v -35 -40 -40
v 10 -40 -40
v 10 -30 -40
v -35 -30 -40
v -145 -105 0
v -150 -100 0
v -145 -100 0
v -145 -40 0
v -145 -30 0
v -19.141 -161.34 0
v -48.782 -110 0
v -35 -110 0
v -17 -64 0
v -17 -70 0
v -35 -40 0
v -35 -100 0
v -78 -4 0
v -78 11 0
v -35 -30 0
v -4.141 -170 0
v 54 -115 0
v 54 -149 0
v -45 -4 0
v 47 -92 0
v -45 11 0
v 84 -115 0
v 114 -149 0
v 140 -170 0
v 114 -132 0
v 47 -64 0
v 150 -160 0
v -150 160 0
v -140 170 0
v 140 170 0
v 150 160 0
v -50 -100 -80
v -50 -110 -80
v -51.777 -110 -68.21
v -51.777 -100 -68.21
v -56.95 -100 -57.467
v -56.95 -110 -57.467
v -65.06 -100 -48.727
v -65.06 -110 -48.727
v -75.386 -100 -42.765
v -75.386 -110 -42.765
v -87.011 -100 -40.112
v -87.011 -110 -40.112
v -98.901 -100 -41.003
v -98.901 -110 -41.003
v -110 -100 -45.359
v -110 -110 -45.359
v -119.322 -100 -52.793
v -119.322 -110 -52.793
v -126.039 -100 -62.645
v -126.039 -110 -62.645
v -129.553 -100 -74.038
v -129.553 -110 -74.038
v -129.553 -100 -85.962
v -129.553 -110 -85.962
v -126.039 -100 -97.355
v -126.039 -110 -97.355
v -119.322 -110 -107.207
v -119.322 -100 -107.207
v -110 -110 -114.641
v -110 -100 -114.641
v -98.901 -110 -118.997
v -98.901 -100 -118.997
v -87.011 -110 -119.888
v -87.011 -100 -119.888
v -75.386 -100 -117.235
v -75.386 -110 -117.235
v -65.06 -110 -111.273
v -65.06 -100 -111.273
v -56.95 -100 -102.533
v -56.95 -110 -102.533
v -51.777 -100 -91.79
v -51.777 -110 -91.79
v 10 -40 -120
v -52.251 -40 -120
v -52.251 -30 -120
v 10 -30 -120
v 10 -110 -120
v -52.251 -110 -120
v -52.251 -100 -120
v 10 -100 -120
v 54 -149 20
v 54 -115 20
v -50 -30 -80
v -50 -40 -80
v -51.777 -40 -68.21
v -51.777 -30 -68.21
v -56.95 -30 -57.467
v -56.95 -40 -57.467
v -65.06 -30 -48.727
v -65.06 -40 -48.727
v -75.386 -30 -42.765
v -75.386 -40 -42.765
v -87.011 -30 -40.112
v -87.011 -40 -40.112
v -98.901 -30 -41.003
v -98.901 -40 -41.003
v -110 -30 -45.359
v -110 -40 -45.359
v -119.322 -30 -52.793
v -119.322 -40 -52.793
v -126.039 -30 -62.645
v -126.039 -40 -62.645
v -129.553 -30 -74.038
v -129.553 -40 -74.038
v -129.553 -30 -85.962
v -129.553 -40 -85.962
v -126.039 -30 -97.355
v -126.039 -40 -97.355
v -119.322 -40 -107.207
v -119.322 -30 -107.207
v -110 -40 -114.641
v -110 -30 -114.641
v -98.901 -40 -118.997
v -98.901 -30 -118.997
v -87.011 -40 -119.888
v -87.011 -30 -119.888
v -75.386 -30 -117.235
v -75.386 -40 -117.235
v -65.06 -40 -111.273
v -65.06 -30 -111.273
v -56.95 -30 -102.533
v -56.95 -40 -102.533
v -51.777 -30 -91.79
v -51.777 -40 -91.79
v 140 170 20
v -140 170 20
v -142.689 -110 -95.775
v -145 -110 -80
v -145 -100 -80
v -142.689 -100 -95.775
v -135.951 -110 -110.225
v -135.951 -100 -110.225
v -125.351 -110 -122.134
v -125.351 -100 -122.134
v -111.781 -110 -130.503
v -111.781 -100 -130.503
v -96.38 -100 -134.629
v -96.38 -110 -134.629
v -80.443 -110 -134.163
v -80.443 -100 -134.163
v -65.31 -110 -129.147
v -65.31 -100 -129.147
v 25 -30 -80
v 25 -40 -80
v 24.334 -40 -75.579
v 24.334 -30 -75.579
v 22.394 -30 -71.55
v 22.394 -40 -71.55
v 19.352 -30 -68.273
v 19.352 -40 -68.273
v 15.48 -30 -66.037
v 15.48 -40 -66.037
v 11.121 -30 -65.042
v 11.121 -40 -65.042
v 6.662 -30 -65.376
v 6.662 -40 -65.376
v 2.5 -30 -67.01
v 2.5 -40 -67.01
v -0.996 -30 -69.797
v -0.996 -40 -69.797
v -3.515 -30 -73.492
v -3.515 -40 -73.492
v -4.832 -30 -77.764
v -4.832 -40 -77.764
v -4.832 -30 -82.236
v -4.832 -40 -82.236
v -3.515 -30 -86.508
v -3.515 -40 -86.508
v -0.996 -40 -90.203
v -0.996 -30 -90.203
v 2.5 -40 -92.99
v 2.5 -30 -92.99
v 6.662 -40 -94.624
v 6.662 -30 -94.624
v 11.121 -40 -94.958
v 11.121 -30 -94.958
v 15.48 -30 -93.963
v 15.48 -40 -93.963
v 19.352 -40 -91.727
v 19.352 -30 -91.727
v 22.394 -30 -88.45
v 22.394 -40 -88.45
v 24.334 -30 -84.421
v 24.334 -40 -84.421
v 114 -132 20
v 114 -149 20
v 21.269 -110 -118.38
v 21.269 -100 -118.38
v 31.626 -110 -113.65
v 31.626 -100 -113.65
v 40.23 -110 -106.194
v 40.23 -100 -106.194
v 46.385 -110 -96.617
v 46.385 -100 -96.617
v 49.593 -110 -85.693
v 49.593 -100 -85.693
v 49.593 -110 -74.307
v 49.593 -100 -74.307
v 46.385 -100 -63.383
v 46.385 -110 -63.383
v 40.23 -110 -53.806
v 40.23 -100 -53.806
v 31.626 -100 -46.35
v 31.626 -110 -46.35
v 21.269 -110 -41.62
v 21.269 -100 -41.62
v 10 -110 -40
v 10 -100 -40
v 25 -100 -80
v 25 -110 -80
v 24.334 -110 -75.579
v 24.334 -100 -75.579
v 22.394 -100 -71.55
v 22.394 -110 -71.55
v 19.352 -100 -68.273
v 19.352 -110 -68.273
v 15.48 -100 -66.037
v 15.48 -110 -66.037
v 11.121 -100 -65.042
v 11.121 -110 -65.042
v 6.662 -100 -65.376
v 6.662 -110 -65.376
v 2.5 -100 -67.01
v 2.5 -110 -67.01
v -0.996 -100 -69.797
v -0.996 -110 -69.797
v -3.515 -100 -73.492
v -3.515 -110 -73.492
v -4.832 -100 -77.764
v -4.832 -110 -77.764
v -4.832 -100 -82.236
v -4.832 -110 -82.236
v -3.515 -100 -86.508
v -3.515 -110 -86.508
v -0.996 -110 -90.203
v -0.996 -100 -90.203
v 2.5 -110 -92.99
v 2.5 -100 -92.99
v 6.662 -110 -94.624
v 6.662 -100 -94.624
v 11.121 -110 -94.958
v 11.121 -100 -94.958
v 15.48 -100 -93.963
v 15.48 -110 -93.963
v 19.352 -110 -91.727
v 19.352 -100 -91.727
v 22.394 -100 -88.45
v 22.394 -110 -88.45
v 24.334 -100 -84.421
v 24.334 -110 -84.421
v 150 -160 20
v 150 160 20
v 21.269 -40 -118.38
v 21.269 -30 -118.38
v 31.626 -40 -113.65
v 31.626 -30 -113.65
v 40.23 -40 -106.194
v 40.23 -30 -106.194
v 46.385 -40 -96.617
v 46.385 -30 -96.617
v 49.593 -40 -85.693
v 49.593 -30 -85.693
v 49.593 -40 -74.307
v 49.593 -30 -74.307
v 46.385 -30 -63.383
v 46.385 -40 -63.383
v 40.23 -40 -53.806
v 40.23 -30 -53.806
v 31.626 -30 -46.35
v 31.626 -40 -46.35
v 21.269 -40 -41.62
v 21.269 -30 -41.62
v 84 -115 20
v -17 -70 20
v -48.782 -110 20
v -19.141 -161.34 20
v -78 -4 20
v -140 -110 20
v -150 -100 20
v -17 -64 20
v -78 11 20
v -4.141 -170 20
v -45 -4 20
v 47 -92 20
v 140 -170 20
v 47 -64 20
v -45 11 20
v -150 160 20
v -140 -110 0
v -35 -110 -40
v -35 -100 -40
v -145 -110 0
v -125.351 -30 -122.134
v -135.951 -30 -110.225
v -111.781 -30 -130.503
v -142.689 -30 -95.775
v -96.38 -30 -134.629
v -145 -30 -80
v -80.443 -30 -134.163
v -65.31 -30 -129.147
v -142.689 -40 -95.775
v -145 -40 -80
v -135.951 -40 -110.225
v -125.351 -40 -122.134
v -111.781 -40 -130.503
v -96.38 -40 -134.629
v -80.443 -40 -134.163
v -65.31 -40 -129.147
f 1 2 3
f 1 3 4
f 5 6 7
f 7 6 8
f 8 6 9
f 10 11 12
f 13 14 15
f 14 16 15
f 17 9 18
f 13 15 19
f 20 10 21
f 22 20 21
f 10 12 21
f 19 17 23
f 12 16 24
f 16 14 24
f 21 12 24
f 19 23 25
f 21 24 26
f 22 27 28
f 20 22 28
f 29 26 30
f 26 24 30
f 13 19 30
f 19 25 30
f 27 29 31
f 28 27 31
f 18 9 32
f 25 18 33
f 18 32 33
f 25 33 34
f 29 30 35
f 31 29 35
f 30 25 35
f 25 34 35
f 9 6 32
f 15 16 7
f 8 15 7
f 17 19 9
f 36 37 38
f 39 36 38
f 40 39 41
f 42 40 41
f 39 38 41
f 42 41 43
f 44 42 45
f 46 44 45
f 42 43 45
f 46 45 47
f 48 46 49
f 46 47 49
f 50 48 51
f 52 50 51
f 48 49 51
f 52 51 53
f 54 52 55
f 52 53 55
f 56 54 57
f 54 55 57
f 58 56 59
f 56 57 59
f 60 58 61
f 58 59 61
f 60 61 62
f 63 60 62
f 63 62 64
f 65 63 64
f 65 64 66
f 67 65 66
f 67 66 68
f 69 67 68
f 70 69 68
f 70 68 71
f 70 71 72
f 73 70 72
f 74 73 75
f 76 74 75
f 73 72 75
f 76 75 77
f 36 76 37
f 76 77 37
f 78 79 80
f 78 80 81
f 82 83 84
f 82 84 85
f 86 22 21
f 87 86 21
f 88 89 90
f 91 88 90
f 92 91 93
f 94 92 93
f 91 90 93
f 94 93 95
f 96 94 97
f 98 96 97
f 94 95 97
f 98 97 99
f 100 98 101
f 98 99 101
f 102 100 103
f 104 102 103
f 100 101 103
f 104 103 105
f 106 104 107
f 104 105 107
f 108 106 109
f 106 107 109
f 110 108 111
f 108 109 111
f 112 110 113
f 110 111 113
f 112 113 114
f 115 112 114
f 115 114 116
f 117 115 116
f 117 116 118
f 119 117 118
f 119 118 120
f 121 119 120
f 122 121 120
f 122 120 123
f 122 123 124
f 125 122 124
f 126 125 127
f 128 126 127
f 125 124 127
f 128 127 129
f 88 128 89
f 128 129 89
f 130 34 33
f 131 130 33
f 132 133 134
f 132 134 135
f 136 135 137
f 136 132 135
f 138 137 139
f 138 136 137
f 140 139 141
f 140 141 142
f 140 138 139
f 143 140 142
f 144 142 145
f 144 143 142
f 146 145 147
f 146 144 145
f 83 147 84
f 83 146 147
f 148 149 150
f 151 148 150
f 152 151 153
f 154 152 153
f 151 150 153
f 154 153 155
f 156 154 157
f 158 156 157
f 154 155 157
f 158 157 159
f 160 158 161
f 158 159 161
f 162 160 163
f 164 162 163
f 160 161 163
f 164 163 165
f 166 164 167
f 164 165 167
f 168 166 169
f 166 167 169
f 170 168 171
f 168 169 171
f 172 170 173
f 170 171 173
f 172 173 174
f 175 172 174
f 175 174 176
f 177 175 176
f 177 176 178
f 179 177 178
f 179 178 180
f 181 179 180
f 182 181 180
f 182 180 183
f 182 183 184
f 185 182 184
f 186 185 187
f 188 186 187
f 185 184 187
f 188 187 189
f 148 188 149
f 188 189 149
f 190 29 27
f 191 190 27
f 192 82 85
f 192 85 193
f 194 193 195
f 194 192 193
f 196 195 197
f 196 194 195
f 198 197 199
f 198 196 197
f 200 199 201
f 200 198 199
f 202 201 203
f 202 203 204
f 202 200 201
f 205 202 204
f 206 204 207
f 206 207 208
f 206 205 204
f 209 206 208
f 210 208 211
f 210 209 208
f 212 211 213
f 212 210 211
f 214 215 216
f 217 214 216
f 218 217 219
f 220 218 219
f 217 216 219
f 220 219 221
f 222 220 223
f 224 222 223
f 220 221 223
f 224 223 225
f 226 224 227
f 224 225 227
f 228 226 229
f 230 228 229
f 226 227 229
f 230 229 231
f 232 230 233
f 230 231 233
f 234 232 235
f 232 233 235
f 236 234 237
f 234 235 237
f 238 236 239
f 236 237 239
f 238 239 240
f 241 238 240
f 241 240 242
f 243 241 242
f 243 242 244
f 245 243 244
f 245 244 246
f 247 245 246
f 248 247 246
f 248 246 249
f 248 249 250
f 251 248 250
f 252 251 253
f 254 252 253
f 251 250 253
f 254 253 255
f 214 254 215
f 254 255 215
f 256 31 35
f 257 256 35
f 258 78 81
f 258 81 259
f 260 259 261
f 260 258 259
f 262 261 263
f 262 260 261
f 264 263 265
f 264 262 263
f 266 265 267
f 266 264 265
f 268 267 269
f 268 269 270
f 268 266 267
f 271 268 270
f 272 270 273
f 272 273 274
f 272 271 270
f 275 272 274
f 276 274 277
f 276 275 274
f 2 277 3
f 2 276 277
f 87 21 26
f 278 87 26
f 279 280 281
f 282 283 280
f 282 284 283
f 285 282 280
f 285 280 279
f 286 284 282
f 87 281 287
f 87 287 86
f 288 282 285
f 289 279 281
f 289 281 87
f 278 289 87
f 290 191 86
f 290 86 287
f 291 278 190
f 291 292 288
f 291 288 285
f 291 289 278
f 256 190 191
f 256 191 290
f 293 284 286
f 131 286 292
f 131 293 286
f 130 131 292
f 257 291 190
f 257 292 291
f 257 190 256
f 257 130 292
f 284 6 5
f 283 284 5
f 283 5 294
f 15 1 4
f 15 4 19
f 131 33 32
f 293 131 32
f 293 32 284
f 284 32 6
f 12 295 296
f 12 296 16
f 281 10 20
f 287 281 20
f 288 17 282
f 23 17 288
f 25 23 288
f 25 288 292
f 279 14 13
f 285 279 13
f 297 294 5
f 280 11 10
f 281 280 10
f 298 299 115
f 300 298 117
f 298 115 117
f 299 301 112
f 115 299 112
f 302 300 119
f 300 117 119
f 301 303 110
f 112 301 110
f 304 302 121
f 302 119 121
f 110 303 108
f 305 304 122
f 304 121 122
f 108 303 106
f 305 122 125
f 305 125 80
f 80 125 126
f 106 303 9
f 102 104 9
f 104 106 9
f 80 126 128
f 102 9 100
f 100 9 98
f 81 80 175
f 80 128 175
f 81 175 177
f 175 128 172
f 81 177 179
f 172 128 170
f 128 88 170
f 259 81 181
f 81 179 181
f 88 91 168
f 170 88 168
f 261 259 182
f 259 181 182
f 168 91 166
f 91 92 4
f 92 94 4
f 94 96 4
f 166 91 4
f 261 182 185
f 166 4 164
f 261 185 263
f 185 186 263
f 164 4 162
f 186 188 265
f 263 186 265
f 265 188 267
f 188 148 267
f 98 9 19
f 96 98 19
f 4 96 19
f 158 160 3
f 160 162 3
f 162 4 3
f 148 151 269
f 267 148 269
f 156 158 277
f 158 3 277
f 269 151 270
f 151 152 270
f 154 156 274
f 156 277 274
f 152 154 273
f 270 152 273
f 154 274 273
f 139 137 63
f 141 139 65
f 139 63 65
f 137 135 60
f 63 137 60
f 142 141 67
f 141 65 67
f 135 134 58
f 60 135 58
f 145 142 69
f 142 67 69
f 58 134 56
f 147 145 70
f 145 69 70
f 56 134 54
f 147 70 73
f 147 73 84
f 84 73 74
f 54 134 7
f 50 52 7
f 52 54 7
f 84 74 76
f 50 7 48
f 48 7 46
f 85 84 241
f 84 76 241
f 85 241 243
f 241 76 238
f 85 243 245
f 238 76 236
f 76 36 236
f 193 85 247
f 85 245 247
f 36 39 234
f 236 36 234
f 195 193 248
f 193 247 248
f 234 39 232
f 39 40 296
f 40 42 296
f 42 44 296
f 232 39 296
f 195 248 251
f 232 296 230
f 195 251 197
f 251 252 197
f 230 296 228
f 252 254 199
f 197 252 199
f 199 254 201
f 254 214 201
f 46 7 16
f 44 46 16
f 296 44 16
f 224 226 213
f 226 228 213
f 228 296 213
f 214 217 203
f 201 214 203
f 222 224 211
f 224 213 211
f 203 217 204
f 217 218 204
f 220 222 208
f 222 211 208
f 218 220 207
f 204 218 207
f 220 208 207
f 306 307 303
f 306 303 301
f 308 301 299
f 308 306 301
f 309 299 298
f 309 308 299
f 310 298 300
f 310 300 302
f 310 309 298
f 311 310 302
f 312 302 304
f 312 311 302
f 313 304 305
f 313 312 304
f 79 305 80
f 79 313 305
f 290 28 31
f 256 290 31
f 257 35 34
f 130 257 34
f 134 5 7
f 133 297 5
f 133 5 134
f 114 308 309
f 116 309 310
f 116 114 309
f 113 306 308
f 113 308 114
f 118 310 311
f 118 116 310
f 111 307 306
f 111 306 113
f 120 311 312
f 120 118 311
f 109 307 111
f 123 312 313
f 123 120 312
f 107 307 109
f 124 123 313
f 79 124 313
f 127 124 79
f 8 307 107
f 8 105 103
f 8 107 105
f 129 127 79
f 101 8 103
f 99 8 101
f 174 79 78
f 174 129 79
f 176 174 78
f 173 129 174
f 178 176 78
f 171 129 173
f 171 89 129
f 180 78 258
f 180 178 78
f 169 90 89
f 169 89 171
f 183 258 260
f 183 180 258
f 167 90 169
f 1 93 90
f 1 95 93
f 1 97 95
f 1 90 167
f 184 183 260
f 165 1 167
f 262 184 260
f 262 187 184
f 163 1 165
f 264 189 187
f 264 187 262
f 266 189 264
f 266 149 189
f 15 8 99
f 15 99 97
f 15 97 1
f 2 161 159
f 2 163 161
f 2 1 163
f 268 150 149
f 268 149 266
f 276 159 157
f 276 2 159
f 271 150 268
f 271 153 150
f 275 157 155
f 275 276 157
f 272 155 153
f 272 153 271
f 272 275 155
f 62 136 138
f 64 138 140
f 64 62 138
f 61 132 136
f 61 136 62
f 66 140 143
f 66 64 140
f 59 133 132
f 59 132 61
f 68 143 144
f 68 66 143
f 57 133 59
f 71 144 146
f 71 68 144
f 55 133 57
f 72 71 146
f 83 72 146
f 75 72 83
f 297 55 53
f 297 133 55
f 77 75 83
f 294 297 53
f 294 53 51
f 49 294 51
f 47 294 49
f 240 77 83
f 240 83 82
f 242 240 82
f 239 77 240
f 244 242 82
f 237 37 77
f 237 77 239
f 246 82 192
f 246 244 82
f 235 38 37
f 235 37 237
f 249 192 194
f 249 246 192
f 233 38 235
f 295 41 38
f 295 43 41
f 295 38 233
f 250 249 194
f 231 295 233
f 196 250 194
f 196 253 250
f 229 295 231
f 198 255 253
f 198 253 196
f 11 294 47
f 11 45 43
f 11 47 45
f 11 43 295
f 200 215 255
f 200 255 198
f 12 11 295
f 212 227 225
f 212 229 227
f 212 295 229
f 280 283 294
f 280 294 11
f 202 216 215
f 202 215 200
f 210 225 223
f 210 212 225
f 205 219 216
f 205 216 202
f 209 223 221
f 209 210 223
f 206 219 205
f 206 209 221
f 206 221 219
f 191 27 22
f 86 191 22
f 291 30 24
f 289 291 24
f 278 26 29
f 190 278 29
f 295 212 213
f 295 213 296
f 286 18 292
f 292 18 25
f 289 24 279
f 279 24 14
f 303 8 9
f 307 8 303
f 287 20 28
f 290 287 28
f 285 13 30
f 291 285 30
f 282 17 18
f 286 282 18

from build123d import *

# Parameters (mm, degrees)
SKETCH2_W           = 33
SKETCH2_H           = 15
BOSS_EXTRUDE1_DEPTH = 20
SKETCH8_R           = 40
SKETCH8_R_2         = 15
BOSS_EXTRUDE3_DEPTH = 10
LPATTERN1_COUNT     = 2
LPATTERN1_PITCH     = 70


with BuildPart() as part:
    # Sketch2 → Boss-Extrude1 (new body)
    with BuildSketch(Plane.XY):
        Polygon((-140, -110), (-48.782097787, -110), (-19.141081636, -161.339745962), (-4.141081636, -170), (140, -170), (150, -160), (150, 160), (140, 170), (-140, 170), (-150, 160), (-150, -100), align=None)
        Polygon((84, -115), (114, -132), (114, -149), (54, -149), (54, -115), align=None, mode=Mode.SUBTRACT)
        Polygon((47, -92), (-17, -70), (-17, -64), (47, -64), align=None, mode=Mode.SUBTRACT)
        with Locations((-61.5, 3.5)):
            Rectangle(SKETCH2_W, SKETCH2_H, mode=Mode.SUBTRACT)
    extrude(amount=BOSS_EXTRUDE1_DEPTH)

    # Sketch8 → Boss-Extrude3 (add)
    with BuildSketch(Plane.XZ.offset(110)):
        with BuildLine():
            Line((-145, 0), (-145, -80))
            ThreePointArc((-145, -80), (-111.780674121, -130.503487353), (-52.250827824, -120))
            Line((-52.250827824, -120), (10, -120))
            ThreePointArc((10, -120), (50, -80), (10, -40))
            Line((10, -40), (-35, -40))
            Line((-35, -40), (-35, 0))
            Line((-35, 0), (-145, 0))
        make_face()
        with Locations((-90, -80)):
            Circle(SKETCH8_R, mode=Mode.SUBTRACT)
        with Locations((10, -80)):
            Circle(SKETCH8_R_2, mode=Mode.SUBTRACT)
    boss_extrude3 = extrude(amount=-BOSS_EXTRUDE3_DEPTH)

    # LPattern1: Boss-Extrude3 ×2
    with Locations(*[(0, i * LPATTERN1_PITCH, 0) for i in range(1, LPATTERN1_COUNT)]):
        add(boss_extrude3)


solid = part.part
